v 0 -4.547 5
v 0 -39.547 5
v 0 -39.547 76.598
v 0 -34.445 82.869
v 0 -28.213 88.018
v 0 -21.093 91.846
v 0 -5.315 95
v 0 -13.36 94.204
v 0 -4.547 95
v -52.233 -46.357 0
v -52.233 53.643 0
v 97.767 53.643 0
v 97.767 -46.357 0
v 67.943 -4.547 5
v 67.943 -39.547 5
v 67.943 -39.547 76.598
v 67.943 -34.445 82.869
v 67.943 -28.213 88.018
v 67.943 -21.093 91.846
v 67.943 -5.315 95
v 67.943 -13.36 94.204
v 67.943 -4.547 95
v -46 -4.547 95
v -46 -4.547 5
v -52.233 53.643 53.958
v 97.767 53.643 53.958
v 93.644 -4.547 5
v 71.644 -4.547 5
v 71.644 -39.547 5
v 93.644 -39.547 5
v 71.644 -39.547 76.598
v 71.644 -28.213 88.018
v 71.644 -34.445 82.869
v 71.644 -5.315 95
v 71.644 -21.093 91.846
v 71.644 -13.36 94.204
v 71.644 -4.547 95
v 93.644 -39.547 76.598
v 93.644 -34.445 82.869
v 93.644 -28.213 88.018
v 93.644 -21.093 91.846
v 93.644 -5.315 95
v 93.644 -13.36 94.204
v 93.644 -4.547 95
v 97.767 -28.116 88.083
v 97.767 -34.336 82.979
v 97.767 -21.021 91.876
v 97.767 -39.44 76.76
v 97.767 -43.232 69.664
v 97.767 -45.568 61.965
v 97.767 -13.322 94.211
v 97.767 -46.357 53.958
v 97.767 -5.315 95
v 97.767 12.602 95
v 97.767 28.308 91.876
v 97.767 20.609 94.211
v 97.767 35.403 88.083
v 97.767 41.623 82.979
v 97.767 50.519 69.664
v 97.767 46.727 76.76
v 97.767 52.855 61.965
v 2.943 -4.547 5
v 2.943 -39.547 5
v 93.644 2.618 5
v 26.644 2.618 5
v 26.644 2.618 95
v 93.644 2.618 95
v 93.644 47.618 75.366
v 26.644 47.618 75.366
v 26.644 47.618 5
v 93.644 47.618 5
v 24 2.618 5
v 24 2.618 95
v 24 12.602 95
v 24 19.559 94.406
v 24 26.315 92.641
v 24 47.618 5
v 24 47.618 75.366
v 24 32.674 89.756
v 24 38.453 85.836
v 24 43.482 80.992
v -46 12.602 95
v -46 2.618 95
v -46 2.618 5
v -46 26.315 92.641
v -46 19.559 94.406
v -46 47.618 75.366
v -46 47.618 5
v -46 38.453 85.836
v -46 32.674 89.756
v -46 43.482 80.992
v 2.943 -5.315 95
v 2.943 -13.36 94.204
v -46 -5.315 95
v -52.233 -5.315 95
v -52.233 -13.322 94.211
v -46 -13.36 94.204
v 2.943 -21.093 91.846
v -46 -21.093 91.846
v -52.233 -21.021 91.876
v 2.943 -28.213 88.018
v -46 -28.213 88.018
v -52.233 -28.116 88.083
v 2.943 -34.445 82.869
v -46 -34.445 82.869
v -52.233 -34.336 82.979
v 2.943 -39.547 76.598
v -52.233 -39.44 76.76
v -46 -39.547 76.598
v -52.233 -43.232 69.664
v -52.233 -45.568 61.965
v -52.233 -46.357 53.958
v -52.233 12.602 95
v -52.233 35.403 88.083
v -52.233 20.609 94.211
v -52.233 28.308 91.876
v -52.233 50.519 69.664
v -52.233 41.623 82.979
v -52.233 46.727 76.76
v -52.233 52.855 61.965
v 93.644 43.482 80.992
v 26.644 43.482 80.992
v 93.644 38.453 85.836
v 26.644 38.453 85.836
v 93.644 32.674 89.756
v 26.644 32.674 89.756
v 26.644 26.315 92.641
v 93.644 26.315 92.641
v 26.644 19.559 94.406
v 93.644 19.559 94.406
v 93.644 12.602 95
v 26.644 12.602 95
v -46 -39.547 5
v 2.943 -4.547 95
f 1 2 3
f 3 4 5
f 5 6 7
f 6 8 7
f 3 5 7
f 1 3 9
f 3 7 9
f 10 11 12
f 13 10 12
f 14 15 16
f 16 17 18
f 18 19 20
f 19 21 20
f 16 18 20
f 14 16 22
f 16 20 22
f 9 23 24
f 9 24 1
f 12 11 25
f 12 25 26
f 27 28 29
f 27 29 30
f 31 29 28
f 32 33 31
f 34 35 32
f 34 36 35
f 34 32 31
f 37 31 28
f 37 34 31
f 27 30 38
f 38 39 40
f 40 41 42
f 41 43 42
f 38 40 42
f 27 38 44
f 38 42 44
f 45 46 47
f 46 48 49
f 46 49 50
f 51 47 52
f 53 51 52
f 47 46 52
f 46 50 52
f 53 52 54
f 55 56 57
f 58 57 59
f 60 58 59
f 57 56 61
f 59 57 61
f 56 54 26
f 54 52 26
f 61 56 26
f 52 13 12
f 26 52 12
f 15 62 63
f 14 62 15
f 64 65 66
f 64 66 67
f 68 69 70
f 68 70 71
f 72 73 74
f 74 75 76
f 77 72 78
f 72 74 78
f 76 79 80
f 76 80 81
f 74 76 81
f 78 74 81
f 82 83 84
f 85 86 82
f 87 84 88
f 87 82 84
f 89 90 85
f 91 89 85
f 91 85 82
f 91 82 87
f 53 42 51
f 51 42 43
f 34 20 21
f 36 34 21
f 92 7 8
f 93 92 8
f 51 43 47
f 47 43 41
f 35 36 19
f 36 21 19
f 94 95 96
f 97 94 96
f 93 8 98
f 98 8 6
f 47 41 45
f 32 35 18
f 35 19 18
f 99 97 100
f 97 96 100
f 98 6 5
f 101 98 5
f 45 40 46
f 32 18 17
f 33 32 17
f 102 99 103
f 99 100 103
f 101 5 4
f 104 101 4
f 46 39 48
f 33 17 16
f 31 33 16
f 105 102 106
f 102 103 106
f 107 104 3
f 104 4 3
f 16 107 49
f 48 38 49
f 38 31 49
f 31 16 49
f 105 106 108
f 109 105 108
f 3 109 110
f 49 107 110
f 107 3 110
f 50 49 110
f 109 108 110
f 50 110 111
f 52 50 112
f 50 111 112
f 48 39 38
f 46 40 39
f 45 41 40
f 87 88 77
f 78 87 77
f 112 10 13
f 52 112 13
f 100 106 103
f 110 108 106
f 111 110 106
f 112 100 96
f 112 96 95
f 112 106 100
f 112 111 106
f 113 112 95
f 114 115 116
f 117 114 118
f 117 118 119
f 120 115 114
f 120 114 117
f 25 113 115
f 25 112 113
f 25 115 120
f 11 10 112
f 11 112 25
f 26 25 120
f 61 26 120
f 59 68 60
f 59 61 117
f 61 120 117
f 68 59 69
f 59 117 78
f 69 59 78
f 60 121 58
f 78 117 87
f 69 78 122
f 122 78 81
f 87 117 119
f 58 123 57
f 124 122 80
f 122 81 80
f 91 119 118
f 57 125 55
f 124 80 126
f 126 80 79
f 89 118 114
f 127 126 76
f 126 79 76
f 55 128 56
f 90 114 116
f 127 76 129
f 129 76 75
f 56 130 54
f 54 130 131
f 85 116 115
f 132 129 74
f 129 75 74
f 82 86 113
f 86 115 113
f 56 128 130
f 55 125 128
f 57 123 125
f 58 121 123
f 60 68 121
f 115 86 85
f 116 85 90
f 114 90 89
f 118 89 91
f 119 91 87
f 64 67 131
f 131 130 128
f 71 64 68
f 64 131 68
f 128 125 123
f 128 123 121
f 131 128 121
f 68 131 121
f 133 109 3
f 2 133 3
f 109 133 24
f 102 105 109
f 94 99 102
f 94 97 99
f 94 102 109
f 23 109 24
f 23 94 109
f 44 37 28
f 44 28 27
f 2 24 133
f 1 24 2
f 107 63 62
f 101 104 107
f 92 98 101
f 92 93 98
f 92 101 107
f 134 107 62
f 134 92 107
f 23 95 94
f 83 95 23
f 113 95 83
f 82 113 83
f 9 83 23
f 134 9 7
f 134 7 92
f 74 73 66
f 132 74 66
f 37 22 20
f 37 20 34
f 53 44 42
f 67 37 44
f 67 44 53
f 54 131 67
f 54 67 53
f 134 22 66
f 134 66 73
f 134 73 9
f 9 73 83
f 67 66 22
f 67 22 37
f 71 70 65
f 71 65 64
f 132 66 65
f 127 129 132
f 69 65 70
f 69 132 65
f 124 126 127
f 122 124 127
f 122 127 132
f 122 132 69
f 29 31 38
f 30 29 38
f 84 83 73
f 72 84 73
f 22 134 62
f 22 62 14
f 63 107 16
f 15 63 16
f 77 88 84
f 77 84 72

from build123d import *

# Parameters (mm, degrees)
F0_W        = 150
F0_H        = 100
F1_DEPTH    = 95
F2_W        = 70
F2_H        = 45
F2_W_2      = 67
F2_W_3      = 46
F2_H_2      = 35
F2_W_4      = 65
F2_W_5      = 22
F3_DEPTH    = 90
F4_T1_DEPTH = 355.2081528017


# Not quite as in the source:
# - a fillet or chamfer that OpenCascade refuses, or shapes differently, is made with other operations: its cross-section is extruded or revolved along the edge and cut away or added


with BuildPart() as f1:
    # F0 (on Top) → F1 (new body)
    with BuildSketch(Plane.XY):
        with Locations((22.7672072938, 3.643443808)):
            Rectangle(F0_W, F0_H)
    extrude(amount=F1_DEPTH)

    # F2 (on face) → F3 (cut)
    with BuildSketch(Plane.XY.offset(95)):
        with Locations((-11, 25.1181102521)):
            Rectangle(F2_W, F2_H)
        with Locations((60.1440875874, 25.1181102521)):
            Rectangle(F2_W_2, F2_H)
        with Locations((-23, -22.0472425799)):
            Rectangle(F2_W_3, F2_H_2)
        with Locations((35.4433003601, -22.0472425799)):
            Rectangle(F2_W_4, F2_H_2)
        with Locations((82.6440875874, -22.0472425799)):
            Rectangle(F2_W_5, F2_H_2)
    extrude(amount=-F3_DEPTH, mode=Mode.SUBTRACT)

    # F4: fillet of radius 41.0416305603 on 2 edges, made by hand

    # F4_s2 → F4_t1 (cut)
    with BuildSketch(Plane.YZ.offset(-154.8368691071)):
        with BuildLine():
            ThreePointArc((-5.3149256317, 95), (-34.3357409119, 82.9791847198), (-46.356556192, 53.9583694397))
            Line((-46.356556192, 53.9583694397), (-46.356556192, 95))
            Line((-46.356556192, 95), (-5.3149256317, 95))
        make_face()
        with BuildLine():
            ThreePointArc((53.643443808, 53.9583694397), (41.6226285278, 82.9791847198), (12.6018132476, 95))
            Line((12.6018132476, 95), (53.643443808, 95))
            Line((53.643443808, 95), (53.643443808, 53.9583694397))
        make_face()
    extrude(amount=F4_T1_DEPTH, mode=Mode.SUBTRACT)


solid = f1.part
